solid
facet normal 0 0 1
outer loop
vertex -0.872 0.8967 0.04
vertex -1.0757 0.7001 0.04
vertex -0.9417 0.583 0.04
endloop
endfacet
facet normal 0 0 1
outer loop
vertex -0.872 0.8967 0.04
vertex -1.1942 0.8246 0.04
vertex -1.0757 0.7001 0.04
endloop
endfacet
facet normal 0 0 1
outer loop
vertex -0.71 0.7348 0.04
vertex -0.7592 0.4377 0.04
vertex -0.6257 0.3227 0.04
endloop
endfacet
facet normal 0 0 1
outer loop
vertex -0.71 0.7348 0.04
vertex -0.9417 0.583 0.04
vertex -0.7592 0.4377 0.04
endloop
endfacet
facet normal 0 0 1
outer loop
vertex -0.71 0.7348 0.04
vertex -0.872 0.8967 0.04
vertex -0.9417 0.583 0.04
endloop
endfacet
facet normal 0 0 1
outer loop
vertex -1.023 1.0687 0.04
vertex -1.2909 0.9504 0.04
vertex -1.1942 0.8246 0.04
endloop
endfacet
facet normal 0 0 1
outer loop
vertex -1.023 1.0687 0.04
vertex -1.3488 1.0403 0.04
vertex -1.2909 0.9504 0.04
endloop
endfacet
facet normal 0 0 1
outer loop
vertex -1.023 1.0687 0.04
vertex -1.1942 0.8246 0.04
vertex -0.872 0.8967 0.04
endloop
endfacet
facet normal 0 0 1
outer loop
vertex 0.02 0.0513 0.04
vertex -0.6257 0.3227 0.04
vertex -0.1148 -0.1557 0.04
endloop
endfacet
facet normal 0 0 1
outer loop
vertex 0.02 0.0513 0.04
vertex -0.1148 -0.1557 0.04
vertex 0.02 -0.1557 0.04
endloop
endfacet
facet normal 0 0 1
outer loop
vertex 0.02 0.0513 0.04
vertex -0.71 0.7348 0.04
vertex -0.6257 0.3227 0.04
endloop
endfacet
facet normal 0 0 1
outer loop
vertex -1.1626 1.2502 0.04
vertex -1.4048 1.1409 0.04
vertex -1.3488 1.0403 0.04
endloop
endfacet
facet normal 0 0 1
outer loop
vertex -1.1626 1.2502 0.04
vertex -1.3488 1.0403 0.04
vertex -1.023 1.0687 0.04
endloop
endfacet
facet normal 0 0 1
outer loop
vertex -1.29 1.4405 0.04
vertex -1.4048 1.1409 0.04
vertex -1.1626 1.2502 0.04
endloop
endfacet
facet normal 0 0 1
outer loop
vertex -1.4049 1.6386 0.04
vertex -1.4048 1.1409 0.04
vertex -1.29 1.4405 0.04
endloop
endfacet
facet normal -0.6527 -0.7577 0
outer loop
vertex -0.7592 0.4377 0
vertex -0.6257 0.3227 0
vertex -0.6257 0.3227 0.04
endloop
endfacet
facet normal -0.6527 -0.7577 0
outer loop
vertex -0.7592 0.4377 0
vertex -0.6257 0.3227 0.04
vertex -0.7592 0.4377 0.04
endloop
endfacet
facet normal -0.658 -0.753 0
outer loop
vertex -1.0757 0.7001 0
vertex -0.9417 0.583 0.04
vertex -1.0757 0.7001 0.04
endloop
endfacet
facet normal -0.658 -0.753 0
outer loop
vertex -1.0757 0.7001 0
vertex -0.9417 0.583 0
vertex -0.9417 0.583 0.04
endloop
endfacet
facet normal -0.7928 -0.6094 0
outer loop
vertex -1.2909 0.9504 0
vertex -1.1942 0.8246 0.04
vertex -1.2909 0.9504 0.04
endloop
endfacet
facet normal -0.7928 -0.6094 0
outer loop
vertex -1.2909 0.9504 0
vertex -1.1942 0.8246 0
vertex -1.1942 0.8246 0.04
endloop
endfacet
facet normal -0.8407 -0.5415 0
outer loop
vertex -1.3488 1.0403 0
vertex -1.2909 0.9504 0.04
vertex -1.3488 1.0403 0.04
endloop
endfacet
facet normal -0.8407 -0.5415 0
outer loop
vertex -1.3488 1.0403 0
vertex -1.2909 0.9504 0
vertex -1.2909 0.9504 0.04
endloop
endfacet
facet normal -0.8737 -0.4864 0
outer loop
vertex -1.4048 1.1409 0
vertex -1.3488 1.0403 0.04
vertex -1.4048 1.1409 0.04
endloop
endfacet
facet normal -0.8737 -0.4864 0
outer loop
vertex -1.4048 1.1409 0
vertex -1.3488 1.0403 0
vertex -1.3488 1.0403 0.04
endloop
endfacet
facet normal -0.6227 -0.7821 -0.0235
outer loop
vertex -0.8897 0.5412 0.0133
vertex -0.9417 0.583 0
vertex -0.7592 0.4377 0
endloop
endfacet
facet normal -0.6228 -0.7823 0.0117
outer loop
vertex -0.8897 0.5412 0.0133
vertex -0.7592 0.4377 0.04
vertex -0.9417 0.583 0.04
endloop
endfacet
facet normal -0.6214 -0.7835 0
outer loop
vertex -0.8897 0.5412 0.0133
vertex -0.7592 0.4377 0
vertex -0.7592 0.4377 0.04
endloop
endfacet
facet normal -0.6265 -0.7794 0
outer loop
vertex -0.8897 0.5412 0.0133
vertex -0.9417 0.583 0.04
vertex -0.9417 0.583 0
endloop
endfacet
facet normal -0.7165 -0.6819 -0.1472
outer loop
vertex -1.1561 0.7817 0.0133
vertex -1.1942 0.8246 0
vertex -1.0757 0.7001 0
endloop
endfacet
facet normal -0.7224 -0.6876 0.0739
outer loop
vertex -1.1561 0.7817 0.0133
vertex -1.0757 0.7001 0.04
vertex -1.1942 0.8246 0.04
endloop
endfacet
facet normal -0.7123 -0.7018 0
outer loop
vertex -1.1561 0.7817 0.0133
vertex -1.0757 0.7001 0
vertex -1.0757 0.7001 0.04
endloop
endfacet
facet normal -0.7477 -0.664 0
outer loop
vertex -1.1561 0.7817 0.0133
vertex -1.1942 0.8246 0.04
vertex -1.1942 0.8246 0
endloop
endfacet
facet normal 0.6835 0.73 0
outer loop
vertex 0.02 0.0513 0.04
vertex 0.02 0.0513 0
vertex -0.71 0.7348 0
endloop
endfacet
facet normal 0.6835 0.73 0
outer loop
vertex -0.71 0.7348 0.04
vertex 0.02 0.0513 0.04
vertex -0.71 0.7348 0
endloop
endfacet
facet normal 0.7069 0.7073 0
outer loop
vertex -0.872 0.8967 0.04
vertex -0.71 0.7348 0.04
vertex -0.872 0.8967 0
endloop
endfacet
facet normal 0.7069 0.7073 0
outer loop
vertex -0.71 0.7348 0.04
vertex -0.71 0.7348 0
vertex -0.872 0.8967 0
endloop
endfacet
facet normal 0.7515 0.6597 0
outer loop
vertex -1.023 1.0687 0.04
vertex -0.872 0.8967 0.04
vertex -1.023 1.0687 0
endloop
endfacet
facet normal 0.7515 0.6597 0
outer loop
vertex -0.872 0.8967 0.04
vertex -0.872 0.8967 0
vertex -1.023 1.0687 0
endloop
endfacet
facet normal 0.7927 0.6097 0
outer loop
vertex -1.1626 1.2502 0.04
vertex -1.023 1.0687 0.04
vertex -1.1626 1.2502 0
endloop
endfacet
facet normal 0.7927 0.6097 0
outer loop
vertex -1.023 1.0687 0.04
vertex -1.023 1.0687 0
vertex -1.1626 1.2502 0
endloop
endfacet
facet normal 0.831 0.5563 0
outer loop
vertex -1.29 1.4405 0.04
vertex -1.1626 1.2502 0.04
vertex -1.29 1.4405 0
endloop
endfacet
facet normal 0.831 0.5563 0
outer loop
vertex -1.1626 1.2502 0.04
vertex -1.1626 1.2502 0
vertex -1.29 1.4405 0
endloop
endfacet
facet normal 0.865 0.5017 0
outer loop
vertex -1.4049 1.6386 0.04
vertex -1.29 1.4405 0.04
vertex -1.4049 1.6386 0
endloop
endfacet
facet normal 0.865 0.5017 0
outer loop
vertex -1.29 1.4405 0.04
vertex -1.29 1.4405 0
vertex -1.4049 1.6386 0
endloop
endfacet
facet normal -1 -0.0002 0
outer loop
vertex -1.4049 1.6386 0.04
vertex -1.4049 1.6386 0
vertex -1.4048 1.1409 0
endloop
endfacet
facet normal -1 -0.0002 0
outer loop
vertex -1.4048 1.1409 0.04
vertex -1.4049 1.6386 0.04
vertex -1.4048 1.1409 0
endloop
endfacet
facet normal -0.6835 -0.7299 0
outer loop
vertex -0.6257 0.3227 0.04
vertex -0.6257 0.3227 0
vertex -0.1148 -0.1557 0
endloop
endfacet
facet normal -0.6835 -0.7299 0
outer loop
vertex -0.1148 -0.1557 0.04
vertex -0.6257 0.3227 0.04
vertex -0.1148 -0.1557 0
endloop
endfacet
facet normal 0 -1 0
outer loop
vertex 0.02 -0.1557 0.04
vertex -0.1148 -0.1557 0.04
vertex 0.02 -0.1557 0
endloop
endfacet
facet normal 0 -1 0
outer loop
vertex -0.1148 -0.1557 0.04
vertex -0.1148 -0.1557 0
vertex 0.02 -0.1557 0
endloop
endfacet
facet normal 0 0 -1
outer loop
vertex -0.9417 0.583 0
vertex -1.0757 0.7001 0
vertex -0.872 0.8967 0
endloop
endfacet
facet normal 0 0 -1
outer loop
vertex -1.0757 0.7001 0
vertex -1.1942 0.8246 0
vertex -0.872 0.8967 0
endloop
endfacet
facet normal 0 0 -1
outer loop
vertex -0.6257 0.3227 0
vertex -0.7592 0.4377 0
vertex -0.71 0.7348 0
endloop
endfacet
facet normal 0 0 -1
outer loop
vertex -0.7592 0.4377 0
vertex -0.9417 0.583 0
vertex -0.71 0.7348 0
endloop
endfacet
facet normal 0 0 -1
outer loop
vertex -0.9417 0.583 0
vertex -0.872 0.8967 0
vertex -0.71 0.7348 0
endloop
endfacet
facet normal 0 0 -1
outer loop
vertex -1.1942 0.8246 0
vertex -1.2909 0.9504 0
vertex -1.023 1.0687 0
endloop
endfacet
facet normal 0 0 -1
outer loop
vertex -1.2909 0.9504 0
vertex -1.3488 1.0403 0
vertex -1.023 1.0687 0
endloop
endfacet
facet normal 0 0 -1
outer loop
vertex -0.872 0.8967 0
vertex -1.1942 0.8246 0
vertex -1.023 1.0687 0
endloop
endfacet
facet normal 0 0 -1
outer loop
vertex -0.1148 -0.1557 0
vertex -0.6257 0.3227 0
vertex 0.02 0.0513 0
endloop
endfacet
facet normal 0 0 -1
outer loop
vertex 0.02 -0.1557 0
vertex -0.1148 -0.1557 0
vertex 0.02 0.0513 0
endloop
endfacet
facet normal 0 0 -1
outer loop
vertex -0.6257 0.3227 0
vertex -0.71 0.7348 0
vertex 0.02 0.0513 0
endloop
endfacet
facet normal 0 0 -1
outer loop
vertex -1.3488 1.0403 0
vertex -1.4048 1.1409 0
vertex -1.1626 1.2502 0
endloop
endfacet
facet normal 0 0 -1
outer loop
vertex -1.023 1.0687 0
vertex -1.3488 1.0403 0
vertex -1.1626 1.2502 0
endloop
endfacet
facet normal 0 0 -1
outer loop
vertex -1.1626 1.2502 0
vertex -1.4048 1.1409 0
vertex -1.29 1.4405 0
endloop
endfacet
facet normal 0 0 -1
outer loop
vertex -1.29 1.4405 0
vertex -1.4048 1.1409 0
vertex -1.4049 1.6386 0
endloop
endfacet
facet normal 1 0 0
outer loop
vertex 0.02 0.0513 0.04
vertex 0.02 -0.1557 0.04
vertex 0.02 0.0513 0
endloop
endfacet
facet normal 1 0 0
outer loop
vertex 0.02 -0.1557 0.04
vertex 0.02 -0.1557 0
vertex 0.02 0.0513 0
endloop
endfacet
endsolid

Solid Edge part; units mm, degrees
sketch "Sketch1" plane through (0, 0, 0) normal (0, 0, 1) x (1, 0, 0)
  line L0 (-0.1148, -0.1557) -> (0.02, -0.1557)
  line L1 (0.02, -0.1557) -> (0.02, 0.0513)
  line L2 (0.02, 0.0513) -> (-0.71, 0.7348)
  arc A0 (-0.71, 0.7348) -> (-1.4048, 1.6386) centre (1.6939, 3.302) cw
  line L3 (-1.4048, 1.6386) -> (-1.4048, 1.1409)
  spline S0 degree 3 poles (-0.6257, 0.3227) (-0.8818, 0.5625) (-1.1717, 0.69) (-1.4048, 1.1409) knots 0 0 0 0 1 1 1 1
  line L4 (-0.6257, 0.3227) -> (-0.1148, -0.1557)
  dimension "D1" = 1
  dimension "D2" = 0.7
extrude "Protrusion1" add sketch "Sketch1" along normal blind 0.04
